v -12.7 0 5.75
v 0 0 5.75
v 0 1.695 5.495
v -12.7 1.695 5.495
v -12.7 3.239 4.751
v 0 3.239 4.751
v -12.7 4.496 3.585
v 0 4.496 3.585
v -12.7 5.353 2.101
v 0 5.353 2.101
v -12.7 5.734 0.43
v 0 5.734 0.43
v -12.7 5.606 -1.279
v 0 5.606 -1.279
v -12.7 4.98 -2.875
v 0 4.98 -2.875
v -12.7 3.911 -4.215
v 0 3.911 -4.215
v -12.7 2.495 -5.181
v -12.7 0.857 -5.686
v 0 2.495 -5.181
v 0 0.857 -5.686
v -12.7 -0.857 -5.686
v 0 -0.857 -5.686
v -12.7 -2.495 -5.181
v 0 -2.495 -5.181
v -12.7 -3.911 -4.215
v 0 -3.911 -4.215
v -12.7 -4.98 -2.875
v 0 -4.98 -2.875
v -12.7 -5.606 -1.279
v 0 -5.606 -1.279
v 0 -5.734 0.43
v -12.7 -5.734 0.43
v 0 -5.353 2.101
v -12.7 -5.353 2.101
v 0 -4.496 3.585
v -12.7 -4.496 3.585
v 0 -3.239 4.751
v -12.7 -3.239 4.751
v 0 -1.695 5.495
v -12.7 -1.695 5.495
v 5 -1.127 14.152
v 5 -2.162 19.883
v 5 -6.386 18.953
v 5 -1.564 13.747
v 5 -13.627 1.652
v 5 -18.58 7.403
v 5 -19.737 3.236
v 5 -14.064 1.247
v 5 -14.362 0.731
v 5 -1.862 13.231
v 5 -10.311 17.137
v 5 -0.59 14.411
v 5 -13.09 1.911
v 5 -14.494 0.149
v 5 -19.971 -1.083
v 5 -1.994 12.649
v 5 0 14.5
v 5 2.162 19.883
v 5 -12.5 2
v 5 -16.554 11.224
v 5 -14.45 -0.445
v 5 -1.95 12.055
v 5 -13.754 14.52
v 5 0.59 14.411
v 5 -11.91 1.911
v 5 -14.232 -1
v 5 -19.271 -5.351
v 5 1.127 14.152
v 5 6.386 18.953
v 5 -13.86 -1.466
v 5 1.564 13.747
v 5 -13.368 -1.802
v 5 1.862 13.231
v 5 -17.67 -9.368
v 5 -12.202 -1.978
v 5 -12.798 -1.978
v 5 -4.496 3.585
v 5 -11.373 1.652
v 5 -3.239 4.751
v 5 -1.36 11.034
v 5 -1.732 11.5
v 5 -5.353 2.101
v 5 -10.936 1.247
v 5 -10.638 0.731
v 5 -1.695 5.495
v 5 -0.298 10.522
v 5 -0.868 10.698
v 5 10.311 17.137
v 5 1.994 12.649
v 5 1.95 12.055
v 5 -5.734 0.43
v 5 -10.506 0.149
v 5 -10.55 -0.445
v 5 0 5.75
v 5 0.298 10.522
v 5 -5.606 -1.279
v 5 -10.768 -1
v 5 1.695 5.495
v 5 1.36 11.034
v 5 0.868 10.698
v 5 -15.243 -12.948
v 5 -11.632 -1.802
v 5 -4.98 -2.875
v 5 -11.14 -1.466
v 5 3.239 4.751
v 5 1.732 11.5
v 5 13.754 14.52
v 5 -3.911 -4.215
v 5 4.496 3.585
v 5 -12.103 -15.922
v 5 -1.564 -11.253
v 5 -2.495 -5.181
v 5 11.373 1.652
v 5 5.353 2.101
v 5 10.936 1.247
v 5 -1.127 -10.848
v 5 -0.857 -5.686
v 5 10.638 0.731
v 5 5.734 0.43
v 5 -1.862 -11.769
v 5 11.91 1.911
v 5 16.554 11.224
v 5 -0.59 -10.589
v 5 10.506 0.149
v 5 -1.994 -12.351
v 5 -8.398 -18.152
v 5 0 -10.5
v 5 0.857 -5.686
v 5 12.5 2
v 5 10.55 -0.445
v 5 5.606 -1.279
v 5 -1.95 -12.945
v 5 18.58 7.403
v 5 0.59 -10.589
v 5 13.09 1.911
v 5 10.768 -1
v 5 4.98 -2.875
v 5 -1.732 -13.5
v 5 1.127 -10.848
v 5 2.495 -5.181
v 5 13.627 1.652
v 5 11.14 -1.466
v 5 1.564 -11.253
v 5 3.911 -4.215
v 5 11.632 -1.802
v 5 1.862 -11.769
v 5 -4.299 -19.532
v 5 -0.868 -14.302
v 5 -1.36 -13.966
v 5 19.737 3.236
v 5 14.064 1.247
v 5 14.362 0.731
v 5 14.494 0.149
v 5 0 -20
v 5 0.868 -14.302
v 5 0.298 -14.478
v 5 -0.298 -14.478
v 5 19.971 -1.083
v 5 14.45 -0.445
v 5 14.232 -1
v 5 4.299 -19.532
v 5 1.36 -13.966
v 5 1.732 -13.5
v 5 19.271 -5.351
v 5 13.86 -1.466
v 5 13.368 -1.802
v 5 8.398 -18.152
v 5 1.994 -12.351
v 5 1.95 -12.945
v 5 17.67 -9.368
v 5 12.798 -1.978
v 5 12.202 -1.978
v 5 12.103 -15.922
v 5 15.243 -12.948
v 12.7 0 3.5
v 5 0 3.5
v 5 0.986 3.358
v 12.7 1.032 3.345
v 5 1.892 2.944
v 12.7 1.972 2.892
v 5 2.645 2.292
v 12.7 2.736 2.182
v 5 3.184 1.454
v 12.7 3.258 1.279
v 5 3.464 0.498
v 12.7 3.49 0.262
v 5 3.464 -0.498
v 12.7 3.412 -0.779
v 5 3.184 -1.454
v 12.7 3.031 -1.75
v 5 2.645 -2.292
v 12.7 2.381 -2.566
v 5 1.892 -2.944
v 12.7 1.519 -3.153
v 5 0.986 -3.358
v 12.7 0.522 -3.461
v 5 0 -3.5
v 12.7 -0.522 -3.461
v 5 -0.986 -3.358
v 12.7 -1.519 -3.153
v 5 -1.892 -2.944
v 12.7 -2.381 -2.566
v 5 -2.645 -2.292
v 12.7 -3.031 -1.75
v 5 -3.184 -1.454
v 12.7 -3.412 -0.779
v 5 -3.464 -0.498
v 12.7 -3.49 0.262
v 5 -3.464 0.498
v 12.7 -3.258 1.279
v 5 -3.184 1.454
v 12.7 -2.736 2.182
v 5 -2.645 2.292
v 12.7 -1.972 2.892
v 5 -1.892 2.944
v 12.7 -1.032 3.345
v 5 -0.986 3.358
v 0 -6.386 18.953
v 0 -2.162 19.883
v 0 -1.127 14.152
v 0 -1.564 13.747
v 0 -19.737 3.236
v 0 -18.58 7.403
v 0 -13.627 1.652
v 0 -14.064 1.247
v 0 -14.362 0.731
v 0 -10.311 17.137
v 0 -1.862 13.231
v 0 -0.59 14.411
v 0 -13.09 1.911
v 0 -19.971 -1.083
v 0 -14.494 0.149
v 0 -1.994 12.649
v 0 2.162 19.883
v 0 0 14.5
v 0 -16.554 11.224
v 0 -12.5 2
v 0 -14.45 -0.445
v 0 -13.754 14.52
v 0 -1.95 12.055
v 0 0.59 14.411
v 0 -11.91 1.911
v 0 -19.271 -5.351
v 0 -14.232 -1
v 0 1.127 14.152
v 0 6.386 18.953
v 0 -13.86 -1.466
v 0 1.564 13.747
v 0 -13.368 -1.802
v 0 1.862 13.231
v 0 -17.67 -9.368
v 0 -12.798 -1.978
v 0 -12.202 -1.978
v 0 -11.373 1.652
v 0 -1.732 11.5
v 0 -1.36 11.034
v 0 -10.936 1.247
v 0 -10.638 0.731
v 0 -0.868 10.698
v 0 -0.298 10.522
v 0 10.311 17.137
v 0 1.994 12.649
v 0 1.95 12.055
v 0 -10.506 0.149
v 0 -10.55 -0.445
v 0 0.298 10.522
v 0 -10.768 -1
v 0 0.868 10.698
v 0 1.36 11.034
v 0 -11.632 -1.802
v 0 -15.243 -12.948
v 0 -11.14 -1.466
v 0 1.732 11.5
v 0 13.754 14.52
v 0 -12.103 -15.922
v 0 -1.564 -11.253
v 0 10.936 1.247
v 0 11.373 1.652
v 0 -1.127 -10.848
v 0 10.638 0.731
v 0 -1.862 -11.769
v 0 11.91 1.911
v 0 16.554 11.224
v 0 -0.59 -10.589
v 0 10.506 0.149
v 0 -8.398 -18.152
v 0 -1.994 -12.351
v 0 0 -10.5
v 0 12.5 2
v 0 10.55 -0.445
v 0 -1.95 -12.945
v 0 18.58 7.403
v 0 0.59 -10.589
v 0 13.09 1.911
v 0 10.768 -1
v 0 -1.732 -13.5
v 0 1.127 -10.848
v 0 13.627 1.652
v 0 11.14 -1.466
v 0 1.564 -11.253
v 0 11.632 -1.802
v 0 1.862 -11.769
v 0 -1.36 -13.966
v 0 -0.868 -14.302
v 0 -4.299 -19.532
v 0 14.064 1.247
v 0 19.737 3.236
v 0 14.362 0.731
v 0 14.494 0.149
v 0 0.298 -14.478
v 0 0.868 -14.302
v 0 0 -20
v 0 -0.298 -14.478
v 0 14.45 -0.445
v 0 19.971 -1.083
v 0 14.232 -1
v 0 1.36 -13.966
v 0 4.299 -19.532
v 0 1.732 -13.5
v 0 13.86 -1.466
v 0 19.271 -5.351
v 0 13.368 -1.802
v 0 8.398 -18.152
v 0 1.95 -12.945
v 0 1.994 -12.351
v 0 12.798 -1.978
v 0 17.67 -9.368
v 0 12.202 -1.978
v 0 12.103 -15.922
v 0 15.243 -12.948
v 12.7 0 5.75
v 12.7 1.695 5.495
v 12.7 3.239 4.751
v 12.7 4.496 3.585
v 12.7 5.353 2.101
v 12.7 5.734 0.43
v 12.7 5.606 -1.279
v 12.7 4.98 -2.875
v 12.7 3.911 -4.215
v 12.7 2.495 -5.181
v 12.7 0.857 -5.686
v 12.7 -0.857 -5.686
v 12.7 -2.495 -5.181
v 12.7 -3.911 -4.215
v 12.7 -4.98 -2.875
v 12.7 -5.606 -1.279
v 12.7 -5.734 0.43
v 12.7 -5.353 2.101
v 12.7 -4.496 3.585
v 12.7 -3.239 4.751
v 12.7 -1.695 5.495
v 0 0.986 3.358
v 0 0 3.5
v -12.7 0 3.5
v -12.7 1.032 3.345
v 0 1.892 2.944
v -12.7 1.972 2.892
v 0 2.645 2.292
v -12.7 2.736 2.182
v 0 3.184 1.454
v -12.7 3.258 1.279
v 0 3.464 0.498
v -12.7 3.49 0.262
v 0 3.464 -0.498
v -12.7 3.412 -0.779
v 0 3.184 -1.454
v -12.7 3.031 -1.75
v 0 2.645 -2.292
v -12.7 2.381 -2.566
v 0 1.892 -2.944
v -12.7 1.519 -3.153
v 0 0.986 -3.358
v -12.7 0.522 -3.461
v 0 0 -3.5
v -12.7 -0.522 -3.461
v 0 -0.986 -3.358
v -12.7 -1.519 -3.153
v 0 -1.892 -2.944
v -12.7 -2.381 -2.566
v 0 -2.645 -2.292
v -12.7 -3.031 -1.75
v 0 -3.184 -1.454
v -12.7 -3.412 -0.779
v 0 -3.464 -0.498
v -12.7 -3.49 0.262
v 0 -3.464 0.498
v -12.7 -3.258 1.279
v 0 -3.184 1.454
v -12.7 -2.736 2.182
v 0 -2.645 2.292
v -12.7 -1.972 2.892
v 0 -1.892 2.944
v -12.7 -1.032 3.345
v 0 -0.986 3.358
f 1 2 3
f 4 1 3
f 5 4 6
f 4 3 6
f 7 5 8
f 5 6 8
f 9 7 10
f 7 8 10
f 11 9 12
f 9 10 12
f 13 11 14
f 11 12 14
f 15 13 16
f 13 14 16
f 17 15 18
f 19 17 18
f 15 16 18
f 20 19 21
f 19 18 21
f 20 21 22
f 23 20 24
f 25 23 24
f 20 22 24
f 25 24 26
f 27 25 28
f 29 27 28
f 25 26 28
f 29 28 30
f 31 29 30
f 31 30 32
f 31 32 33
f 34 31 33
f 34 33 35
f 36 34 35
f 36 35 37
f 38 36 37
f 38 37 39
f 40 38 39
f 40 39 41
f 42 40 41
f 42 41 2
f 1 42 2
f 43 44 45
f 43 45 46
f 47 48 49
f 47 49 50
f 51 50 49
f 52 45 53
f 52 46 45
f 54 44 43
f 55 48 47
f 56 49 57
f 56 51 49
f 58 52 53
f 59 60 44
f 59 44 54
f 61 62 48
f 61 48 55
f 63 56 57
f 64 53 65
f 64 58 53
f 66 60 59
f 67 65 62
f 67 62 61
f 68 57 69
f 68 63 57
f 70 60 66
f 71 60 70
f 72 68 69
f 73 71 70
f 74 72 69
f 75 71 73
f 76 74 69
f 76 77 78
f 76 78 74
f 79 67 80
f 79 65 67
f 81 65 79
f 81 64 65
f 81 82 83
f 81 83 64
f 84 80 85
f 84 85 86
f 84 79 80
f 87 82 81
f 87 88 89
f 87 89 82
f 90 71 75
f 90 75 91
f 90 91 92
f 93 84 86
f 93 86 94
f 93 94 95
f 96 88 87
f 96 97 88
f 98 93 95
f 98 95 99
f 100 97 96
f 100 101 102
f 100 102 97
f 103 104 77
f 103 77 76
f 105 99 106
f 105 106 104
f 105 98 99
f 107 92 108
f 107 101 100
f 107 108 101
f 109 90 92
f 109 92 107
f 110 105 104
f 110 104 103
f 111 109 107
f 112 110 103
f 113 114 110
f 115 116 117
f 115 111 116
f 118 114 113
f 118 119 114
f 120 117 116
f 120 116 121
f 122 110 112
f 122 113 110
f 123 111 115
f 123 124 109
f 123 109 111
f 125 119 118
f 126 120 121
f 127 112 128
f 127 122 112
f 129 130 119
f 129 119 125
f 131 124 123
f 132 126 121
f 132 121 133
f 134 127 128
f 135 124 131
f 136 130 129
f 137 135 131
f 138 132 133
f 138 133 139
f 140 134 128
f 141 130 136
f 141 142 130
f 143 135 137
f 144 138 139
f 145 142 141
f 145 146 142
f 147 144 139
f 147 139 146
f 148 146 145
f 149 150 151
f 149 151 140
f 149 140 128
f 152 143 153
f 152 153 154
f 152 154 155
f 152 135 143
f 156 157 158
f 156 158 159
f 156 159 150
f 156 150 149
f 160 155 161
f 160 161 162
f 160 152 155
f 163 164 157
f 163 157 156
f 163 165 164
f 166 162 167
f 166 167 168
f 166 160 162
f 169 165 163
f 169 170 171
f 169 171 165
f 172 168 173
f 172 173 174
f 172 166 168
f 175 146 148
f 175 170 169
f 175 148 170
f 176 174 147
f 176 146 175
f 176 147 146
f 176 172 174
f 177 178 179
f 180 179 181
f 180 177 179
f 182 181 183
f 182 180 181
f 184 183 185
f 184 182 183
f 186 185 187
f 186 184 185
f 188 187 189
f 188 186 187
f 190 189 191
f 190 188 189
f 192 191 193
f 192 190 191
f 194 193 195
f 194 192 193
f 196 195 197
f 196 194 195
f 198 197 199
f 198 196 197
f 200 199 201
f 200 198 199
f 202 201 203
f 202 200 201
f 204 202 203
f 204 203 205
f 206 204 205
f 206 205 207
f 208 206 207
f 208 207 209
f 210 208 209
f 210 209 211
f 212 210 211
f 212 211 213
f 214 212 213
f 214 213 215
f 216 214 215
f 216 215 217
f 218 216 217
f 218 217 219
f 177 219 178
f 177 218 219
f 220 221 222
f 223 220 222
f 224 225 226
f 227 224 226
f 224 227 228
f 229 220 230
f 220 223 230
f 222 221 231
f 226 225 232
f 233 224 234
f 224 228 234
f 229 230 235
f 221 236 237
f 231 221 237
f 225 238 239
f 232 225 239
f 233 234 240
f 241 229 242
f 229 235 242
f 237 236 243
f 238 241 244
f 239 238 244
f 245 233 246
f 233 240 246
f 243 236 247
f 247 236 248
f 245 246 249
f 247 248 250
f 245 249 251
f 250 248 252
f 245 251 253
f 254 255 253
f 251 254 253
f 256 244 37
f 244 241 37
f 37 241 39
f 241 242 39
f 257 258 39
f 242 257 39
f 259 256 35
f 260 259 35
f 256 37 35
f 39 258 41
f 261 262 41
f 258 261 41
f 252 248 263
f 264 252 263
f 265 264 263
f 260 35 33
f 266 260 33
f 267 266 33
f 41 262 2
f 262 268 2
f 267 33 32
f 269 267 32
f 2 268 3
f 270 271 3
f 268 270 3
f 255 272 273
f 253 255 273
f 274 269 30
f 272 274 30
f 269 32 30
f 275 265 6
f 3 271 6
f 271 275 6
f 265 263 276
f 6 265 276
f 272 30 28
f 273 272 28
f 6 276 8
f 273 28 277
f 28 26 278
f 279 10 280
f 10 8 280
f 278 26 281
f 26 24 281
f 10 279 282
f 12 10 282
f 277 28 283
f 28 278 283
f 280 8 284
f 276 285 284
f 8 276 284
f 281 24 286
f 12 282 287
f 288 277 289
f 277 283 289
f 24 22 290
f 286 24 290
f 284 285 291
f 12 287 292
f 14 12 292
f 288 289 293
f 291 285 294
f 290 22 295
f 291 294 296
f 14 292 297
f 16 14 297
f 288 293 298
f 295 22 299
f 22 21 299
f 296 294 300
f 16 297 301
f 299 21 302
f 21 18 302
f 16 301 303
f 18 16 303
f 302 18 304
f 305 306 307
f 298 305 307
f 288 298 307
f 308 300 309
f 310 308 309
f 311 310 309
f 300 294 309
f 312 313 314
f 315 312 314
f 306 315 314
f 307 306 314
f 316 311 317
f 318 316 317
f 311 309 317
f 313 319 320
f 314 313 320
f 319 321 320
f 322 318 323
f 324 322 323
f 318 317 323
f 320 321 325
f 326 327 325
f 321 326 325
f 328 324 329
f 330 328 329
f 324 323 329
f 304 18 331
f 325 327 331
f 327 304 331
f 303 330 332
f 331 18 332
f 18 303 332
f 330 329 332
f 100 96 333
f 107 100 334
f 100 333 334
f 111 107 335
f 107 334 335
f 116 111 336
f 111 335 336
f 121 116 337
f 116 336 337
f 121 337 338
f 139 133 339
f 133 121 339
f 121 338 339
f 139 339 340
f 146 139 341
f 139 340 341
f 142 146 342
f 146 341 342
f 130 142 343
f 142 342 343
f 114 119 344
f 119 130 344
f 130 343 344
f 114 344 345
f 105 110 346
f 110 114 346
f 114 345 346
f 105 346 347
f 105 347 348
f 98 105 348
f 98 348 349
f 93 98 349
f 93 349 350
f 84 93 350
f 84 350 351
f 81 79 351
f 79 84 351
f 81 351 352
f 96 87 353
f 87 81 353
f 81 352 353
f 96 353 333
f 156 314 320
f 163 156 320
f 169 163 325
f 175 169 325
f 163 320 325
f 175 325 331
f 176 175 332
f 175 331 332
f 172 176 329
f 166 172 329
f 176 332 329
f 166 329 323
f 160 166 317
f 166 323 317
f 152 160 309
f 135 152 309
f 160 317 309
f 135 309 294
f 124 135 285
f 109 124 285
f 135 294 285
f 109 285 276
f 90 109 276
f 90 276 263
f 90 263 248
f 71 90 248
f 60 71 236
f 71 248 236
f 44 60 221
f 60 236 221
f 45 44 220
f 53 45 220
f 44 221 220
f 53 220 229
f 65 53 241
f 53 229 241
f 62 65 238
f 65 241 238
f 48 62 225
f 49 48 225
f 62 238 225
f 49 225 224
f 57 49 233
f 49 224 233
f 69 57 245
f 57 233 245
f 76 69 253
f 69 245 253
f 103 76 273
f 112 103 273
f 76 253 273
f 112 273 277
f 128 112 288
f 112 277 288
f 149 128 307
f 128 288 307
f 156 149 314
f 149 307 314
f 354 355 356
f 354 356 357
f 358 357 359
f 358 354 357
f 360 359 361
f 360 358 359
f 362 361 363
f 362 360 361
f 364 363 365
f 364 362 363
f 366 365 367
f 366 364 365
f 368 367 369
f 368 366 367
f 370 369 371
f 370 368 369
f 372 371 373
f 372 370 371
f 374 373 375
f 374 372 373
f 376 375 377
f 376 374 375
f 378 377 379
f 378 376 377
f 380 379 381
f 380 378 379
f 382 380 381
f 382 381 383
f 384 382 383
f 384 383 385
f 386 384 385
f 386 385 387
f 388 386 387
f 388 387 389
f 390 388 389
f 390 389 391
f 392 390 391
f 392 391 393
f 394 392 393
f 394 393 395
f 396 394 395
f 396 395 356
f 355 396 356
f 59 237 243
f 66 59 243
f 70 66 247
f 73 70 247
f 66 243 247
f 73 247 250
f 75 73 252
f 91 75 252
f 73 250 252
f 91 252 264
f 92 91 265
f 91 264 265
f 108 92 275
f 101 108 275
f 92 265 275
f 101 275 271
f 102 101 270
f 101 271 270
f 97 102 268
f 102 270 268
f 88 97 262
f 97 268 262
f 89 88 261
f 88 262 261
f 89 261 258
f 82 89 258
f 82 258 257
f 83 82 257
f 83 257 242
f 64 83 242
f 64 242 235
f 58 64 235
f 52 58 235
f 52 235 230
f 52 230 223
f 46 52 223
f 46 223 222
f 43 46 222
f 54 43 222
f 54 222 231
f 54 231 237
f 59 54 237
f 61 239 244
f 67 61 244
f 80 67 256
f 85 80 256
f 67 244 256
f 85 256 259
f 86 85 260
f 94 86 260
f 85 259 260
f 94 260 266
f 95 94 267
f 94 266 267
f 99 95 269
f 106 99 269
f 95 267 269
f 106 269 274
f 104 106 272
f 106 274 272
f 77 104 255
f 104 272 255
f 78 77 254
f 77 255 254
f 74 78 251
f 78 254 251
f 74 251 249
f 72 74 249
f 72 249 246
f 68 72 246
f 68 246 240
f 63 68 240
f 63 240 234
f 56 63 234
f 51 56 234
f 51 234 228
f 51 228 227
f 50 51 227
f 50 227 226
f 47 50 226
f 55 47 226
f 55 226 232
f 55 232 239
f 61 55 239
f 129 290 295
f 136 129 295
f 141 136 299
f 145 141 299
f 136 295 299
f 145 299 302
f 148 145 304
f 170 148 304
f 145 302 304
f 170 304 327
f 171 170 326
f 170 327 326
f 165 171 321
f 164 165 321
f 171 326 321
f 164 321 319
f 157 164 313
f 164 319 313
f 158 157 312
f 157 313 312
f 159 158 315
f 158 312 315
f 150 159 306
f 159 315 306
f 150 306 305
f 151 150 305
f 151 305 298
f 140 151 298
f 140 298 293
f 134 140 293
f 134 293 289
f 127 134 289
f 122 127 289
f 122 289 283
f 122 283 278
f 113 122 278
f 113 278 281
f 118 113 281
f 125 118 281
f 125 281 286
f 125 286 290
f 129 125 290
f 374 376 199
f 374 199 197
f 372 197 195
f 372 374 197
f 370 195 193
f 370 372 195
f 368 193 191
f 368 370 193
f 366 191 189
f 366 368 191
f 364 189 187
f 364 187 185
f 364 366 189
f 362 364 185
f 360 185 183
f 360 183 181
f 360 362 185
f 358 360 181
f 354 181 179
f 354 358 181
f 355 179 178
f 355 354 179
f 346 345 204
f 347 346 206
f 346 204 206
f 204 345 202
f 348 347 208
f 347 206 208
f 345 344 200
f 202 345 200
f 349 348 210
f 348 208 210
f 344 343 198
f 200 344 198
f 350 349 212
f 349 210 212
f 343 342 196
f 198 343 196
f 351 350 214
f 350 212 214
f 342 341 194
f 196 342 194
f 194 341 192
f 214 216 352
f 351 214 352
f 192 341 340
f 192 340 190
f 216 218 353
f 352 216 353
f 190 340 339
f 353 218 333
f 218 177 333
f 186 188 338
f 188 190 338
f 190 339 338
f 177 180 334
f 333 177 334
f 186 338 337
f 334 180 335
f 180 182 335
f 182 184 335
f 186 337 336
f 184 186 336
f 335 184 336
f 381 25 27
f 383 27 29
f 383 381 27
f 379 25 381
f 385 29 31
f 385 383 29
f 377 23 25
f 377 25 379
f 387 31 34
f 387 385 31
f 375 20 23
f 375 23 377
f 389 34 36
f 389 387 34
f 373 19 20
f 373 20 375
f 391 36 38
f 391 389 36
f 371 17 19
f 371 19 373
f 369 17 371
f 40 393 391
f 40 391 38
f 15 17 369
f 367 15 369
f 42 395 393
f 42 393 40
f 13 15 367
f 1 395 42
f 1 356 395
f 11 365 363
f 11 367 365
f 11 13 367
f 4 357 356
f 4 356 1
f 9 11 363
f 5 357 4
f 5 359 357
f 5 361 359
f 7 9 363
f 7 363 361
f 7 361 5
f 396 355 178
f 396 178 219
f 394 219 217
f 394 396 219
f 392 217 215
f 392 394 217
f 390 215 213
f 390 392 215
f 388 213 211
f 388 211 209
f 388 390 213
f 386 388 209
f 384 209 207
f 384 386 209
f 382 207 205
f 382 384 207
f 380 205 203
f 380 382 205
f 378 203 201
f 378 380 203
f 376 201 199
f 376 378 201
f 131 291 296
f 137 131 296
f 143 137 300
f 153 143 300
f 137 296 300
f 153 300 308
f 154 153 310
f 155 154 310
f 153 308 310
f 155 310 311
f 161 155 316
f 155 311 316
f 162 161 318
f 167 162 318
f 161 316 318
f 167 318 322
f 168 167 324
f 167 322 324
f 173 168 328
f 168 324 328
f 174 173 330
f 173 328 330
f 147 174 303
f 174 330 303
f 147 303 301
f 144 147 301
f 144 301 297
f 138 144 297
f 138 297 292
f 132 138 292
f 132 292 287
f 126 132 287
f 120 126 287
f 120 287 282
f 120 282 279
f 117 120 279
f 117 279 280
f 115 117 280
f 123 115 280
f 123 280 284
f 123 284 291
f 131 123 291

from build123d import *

# Parameters (mm, degrees)
SKETCH1_R                    = 20
SKETCH1_R_2                  = 3.5
BOSS_EXTRUDE1_DEPTH          = 5
BOSS_EXTRUDE2_DEPTH          = 12.7
BOSS_EXTRUDE2_DEPTH_BACK     = 12.7
SKETCH3_R                    = 5.75
SKETCH3_R_2                  = 3.5
F_4_0_4_DIAMETER_HOLE1_D     = 4
F_4_0_4_DIAMETER_HOLE1_DEPTH = 15
F_4_0_4_DIAMETER_HOLE1_TIP   = 1.201721238


with BuildPart() as part:
    # Sketch1 → Boss-Extrude1 (new body)
    with BuildSketch(Plane(origin=(0, 0, 0), x_dir=(0, 0, -1), z_dir=(1, 0, 0))):
        Circle(SKETCH1_R)
        Circle(SKETCH1_R_2, mode=Mode.SUBTRACT)
    extrude(amount=BOSS_EXTRUDE1_DEPTH)

    # Sketch3 → Boss-Extrude2 (add, two sides: drawn at the far end of the back side and taken through both)
    with BuildSketch(Plane.ZY.offset(-BOSS_EXTRUDE2_DEPTH_BACK)):
        Circle(SKETCH3_R)
        Circle(SKETCH3_R_2, mode=Mode.SUBTRACT)
    extrude(amount=BOSS_EXTRUDE2_DEPTH + BOSS_EXTRUDE2_DEPTH_BACK)

    # Ø4.0 (4) Diameter Hole1
    with Locations(Plane(origin=(5, 0, 0), x_dir=(0, 0, -1), z_dir=(1, 0, 0))):
        with Locations((12.5, 0), (0, -12.5), (-12.5, 0), (0, 12.5)):
            Hole(F_4_0_4_DIAMETER_HOLE1_D / 2, depth=F_4_0_4_DIAMETER_HOLE1_DEPTH)
            with Locations((0, 0, -(F_4_0_4_DIAMETER_HOLE1_DEPTH + F_4_0_4_DIAMETER_HOLE1_TIP / 2))):  # 118° drill point
                Cone(0, F_4_0_4_DIAMETER_HOLE1_D / 2, F_4_0_4_DIAMETER_HOLE1_TIP, mode=Mode.SUBTRACT)


solid = part.part
